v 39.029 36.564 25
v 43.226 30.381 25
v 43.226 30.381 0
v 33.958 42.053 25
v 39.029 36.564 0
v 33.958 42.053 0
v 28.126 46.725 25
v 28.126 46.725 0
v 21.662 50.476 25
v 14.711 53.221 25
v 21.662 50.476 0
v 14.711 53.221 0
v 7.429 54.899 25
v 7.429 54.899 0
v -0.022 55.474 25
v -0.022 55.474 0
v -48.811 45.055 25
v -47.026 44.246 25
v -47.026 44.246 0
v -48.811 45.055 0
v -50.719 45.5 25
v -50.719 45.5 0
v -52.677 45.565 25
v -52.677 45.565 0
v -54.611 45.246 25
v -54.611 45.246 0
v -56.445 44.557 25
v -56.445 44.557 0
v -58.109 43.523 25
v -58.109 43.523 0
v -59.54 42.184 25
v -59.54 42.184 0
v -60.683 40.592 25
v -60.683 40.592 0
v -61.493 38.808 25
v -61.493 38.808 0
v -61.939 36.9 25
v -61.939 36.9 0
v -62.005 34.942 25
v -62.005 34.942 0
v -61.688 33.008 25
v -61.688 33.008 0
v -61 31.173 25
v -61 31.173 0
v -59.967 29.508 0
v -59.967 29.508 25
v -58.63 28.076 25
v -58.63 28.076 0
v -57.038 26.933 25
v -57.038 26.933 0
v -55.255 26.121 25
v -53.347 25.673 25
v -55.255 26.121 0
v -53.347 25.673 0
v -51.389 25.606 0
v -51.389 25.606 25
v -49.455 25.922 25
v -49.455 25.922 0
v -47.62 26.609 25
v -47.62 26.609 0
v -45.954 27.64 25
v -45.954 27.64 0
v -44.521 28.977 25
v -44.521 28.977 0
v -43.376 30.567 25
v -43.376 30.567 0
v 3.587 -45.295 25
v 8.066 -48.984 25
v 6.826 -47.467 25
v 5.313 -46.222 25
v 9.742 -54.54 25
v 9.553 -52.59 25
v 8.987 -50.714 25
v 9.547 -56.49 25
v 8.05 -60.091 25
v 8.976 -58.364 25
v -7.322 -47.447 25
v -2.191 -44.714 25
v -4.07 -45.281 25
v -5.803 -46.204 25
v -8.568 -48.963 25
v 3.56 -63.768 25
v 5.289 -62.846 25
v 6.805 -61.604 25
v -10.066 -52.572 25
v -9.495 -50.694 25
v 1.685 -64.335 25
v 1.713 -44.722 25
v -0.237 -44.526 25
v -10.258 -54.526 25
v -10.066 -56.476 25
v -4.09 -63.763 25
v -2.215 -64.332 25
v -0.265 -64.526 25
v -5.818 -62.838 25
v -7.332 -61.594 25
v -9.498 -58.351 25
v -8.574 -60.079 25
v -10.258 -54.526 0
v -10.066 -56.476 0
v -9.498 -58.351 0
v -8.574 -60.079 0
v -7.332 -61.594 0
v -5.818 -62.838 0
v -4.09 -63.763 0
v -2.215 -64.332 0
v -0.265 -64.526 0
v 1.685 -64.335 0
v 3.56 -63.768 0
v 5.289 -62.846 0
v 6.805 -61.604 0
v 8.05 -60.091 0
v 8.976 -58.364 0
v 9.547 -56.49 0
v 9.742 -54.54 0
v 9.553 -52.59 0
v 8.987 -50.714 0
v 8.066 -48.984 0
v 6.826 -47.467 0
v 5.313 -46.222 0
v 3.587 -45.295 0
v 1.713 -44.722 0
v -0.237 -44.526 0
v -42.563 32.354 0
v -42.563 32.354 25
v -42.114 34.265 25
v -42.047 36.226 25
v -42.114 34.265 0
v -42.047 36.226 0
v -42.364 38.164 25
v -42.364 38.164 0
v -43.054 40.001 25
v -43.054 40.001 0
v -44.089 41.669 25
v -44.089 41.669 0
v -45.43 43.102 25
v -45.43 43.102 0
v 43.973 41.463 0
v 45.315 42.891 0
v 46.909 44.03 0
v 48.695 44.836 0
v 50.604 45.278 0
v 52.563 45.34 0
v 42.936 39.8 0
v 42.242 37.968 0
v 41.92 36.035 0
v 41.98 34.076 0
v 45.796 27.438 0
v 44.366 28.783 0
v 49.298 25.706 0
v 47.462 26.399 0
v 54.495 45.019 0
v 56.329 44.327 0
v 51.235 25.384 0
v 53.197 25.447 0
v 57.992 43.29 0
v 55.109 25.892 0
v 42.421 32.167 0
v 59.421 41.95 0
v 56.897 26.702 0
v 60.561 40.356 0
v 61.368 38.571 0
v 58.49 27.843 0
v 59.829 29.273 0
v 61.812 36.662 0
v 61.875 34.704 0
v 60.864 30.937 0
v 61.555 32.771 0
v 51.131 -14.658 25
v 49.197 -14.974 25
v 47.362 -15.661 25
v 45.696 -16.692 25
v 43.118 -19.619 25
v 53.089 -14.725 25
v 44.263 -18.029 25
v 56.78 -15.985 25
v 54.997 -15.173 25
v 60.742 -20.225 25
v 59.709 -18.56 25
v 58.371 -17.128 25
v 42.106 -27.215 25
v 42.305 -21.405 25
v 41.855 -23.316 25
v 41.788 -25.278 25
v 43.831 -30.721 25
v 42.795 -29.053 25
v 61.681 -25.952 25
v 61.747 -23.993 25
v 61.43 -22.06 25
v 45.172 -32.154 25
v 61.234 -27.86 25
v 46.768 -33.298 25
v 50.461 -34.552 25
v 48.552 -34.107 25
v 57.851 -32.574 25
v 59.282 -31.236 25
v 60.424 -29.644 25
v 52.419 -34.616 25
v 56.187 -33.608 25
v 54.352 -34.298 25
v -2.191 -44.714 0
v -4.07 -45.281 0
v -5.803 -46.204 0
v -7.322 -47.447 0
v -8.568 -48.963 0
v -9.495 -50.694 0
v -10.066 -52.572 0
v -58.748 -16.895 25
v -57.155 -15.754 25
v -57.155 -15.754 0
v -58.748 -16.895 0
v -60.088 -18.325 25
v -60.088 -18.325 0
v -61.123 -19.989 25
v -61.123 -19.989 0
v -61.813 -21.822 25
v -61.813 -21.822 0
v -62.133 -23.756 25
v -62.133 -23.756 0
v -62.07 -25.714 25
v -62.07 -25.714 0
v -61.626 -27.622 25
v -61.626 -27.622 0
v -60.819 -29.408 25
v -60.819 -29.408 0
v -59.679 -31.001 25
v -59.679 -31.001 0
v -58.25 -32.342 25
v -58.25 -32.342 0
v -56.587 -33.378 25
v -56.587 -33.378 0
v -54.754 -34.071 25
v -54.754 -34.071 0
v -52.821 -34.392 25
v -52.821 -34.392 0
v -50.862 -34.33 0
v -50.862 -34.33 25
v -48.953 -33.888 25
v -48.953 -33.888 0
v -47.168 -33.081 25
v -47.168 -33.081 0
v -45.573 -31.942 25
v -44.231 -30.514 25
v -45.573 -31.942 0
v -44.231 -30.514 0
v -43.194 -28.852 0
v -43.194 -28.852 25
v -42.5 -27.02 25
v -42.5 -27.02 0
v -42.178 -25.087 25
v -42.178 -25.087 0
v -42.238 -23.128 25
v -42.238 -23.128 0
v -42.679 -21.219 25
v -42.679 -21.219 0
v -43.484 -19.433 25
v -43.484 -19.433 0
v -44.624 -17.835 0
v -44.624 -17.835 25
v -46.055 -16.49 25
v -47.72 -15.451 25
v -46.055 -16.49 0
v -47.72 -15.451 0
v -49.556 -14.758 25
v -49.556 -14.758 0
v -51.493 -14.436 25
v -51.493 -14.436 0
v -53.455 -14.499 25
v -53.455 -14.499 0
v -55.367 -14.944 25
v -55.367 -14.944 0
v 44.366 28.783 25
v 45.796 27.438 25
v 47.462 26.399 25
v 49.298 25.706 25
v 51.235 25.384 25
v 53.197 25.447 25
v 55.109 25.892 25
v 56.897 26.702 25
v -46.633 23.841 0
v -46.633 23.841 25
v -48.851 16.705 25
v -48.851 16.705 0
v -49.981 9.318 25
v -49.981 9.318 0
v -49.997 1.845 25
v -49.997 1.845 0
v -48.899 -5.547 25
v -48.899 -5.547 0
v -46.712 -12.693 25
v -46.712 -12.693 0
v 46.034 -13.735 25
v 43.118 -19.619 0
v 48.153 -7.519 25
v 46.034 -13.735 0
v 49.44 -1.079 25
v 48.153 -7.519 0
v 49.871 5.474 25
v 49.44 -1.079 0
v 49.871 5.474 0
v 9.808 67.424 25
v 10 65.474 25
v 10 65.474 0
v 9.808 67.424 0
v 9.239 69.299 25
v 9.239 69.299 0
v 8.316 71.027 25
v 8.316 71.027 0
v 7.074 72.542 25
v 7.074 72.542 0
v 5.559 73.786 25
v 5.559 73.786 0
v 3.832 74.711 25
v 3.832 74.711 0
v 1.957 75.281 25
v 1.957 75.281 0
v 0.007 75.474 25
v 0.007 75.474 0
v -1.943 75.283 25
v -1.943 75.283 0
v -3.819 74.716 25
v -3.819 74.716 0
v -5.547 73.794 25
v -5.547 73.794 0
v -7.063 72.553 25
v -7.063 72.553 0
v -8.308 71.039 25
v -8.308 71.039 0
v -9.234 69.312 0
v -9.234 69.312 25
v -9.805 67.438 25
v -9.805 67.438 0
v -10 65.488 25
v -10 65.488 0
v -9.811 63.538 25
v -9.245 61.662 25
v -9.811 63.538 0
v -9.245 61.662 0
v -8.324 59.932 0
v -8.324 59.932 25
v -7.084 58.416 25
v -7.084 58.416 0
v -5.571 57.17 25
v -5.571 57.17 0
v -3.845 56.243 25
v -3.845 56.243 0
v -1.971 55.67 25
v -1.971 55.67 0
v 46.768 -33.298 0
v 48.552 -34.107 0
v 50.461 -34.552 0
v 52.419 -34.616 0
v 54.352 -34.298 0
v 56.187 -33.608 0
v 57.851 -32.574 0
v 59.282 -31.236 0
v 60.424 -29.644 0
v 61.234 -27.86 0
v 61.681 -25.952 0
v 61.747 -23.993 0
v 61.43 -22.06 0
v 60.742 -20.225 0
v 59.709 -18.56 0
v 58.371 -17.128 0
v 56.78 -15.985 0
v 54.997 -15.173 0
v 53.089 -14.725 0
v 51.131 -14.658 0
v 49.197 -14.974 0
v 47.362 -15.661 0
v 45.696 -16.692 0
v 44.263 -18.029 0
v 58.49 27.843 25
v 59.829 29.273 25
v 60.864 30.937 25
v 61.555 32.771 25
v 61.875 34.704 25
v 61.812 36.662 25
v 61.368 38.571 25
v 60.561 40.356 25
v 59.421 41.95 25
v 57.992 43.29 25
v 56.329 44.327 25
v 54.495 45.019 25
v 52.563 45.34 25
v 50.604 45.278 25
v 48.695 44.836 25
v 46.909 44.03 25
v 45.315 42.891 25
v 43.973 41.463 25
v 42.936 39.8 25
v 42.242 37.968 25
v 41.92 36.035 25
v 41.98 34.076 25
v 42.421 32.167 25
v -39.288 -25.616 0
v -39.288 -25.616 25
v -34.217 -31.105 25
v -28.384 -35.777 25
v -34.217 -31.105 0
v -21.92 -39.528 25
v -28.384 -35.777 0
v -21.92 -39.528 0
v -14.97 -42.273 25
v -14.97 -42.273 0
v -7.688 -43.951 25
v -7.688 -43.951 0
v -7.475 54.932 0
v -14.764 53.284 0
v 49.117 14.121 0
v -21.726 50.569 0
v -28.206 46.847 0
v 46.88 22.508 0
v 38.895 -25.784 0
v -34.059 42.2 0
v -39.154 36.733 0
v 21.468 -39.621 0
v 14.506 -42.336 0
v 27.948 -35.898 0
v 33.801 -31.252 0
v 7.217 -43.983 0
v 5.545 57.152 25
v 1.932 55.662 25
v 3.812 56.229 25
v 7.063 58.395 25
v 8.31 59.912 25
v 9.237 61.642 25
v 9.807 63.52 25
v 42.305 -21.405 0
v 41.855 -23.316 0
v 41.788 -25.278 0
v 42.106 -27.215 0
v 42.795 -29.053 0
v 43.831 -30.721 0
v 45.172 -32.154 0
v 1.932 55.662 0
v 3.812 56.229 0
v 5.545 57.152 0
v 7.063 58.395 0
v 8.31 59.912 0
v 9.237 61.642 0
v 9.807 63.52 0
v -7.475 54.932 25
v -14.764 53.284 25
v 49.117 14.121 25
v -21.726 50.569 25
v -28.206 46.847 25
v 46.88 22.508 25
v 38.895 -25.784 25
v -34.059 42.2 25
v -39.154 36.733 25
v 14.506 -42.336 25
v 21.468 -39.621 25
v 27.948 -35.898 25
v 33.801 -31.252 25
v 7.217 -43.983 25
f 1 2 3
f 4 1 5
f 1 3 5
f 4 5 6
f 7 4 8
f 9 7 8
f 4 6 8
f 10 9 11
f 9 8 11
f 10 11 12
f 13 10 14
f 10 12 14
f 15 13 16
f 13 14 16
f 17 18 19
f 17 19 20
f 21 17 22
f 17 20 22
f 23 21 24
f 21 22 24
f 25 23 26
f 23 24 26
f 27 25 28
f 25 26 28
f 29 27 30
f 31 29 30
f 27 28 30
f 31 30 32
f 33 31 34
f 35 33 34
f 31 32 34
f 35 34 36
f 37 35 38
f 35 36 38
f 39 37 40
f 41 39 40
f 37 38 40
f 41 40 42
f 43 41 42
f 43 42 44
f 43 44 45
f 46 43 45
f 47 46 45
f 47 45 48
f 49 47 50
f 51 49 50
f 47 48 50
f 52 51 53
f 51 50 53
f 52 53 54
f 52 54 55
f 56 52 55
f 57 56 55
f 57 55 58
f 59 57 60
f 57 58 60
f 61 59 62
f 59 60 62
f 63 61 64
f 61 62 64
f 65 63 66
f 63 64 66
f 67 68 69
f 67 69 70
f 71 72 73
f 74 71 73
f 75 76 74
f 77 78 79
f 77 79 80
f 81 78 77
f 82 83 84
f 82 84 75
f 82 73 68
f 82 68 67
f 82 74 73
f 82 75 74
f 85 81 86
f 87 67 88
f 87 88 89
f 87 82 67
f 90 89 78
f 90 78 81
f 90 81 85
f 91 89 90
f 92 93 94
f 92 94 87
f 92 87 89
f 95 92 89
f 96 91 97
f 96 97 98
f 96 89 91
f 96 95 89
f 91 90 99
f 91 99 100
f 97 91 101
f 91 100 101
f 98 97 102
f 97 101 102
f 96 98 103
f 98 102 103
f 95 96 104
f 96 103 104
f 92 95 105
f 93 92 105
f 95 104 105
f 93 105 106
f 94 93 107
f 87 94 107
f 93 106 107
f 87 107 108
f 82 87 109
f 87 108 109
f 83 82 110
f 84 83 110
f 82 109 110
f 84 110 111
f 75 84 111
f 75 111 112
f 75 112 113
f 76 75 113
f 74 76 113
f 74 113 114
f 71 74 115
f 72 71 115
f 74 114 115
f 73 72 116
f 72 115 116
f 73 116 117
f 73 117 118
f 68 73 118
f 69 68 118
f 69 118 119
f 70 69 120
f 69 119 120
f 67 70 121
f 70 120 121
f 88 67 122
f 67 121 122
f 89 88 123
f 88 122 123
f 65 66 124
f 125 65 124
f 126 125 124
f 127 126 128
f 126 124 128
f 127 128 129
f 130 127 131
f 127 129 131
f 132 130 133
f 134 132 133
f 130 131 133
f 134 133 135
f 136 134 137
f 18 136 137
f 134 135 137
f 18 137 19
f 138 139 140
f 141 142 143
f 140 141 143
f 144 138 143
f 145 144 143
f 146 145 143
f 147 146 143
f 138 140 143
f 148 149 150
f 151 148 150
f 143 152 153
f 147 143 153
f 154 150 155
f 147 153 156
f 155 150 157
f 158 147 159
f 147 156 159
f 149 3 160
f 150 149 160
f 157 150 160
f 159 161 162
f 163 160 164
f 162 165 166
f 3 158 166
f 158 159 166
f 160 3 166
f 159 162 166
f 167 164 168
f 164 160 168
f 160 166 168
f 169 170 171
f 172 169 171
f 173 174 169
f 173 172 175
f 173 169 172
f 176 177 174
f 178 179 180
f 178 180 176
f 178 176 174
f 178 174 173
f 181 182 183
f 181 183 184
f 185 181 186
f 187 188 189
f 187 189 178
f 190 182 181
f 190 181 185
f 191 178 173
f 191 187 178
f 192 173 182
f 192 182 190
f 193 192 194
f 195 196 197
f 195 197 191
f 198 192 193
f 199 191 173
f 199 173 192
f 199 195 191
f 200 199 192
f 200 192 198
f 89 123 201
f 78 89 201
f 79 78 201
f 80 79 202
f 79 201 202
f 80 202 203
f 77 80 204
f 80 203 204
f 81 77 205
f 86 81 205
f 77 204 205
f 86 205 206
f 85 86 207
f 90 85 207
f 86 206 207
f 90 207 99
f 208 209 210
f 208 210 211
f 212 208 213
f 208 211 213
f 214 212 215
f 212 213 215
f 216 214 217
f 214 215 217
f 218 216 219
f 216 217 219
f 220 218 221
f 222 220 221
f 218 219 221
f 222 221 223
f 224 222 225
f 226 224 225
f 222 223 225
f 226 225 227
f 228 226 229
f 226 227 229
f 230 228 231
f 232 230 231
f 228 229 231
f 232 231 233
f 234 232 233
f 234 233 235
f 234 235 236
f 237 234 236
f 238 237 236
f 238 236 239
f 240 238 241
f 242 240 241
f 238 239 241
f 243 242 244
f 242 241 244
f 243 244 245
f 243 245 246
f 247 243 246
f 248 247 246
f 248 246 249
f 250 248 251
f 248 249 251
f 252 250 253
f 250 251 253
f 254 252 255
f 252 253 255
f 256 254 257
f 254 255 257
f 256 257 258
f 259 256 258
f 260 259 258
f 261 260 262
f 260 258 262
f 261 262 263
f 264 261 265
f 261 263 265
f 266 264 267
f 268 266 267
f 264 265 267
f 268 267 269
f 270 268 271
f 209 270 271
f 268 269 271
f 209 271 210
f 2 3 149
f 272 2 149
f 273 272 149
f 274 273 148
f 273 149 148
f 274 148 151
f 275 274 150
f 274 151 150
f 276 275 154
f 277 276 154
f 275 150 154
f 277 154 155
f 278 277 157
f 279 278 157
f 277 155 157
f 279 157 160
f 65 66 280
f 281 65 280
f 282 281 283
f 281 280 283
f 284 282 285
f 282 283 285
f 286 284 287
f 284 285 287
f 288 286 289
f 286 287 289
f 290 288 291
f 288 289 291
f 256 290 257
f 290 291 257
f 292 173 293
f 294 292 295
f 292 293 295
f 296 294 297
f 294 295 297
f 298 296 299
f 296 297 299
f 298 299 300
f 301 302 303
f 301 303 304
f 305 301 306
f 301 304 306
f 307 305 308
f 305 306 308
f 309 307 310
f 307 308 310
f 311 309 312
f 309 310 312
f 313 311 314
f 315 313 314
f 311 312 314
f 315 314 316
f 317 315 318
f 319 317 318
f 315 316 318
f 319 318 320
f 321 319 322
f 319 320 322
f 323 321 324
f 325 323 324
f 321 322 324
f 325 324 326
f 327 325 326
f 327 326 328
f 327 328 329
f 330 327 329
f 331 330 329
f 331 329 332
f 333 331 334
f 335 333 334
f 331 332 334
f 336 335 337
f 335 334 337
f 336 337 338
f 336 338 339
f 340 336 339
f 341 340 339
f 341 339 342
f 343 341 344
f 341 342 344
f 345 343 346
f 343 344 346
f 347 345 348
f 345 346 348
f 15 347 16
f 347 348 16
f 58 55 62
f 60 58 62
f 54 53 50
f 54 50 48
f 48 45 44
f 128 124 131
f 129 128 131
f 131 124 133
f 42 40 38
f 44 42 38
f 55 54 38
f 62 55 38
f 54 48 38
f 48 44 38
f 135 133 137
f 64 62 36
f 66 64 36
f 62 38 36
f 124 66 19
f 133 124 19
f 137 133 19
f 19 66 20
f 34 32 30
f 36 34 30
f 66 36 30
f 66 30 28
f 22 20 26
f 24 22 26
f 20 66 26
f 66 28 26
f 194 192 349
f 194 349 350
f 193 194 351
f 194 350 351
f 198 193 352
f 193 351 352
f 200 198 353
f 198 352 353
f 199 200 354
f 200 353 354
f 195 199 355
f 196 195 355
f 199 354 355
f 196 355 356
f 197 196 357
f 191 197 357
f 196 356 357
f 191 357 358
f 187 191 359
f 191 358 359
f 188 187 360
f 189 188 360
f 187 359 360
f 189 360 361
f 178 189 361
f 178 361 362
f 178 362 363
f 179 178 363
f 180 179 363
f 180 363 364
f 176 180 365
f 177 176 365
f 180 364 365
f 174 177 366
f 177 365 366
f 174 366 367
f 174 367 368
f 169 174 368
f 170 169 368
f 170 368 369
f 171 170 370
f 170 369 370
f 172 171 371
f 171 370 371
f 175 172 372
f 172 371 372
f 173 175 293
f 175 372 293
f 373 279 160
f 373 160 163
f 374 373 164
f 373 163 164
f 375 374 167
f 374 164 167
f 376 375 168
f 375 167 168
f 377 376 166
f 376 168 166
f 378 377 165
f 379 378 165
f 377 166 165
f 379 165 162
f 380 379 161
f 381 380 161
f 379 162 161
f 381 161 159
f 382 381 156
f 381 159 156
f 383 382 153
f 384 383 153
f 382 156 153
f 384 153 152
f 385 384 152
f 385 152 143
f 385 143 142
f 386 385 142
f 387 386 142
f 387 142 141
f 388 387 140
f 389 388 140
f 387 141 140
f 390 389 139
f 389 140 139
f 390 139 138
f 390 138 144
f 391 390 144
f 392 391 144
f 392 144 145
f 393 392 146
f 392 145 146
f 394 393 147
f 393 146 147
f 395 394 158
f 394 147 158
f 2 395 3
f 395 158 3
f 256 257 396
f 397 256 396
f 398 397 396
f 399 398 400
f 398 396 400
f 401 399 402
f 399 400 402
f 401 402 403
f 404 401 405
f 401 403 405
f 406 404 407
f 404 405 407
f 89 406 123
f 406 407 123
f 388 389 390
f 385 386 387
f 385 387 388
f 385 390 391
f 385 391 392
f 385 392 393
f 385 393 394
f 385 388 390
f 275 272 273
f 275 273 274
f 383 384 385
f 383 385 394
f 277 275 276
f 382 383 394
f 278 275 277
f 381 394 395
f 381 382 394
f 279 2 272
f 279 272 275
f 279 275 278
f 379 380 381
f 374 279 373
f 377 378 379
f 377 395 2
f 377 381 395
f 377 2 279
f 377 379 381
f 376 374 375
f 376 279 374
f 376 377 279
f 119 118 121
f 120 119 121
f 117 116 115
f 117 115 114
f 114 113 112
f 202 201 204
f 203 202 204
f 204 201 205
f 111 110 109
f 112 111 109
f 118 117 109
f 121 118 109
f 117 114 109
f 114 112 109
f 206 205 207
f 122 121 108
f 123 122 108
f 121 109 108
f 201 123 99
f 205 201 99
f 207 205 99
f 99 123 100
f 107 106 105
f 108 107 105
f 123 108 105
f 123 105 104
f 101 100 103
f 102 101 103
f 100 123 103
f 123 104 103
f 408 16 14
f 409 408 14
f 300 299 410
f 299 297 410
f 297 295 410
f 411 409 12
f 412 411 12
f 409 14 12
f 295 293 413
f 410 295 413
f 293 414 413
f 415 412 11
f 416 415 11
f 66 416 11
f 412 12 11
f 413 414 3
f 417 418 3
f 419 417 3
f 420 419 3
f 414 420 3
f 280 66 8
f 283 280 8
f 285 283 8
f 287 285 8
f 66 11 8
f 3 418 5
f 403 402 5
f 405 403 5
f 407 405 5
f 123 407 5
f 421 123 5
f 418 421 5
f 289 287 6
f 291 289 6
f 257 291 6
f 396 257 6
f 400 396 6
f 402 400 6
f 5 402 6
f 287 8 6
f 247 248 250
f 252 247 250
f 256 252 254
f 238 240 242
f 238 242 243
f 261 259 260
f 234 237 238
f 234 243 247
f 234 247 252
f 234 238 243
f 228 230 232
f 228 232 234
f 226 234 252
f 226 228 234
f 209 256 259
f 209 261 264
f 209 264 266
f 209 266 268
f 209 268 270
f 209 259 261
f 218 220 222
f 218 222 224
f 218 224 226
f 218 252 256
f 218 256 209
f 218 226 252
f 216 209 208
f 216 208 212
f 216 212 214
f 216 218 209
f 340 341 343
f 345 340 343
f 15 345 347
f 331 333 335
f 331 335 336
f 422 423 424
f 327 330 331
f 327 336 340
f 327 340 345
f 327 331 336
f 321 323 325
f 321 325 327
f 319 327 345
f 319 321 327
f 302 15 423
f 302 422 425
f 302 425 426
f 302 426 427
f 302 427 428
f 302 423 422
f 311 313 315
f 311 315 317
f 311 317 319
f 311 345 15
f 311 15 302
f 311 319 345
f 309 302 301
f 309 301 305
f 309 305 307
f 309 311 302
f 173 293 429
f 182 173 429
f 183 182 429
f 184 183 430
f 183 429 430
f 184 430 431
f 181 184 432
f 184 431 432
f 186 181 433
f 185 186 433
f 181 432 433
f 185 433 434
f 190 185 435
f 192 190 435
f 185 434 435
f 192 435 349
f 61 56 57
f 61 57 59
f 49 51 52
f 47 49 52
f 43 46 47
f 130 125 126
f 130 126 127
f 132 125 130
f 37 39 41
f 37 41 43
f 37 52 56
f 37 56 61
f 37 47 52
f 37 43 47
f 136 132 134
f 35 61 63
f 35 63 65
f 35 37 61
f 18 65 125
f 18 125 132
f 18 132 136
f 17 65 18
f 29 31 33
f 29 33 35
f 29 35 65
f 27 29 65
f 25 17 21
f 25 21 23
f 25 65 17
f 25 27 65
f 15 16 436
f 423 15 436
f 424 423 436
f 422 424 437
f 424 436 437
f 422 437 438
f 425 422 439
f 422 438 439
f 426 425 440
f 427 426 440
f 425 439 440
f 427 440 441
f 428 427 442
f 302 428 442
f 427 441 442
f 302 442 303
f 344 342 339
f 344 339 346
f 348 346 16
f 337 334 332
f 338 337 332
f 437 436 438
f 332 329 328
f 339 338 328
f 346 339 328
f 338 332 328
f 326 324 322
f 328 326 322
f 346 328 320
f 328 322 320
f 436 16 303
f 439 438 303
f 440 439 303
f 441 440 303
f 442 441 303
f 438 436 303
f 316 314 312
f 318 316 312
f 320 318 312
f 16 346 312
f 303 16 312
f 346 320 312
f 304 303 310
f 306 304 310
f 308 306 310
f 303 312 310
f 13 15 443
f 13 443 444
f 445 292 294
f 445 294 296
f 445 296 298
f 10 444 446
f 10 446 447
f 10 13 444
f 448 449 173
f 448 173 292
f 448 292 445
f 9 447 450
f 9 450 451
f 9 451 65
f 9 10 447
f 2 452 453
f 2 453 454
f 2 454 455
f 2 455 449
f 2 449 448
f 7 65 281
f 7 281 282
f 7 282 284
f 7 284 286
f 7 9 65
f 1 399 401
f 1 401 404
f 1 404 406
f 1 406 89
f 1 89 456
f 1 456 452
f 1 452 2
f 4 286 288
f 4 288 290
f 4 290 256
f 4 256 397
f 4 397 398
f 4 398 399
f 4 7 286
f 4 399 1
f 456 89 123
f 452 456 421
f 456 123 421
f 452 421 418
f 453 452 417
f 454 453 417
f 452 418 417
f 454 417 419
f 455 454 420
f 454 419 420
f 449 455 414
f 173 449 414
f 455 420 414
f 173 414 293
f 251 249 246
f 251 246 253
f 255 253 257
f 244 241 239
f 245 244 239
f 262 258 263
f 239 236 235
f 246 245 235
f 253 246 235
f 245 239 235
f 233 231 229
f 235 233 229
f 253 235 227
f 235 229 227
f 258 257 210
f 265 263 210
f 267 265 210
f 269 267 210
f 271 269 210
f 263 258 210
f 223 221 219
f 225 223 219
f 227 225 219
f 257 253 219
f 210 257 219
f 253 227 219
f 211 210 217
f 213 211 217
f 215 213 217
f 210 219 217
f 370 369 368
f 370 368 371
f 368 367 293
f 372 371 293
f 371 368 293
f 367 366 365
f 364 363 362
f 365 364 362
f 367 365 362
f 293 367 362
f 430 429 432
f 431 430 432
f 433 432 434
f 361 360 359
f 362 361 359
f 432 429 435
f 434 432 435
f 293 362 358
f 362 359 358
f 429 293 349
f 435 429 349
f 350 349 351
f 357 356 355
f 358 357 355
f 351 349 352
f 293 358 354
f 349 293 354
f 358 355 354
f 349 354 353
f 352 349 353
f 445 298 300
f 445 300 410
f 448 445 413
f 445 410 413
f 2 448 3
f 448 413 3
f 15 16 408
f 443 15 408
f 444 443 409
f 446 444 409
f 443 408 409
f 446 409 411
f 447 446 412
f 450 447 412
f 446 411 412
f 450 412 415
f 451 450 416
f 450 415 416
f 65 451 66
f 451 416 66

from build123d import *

# Parameters (mm, degrees)
F1_DEPTH = 25
F2_DEPTH = 25
F3_COUNT = 6


with BuildPart() as f1:
    # F0 (on Top) → F1 (new body)
    with BuildSketch(Plane.XY):
        with BuildLine():
            ThreePointArc((-0.0215190918, 55.4739596518), (-35.5224711994, -29.8432031255), (49.8708874497, 5.4740754154))
            ThreePointArc((49.8708874497, 5.4740754154), (35.2642460987, 40.7913539563), (-0.0215190918, 55.4739596518))
        make_face()
    extrude(amount=F1_DEPTH)

    # F0 (on Top) → F2 (join)
    with BuildSketch(Plane.XY):
        with BuildLine():
            ThreePointArc((10, 65.4739364982), (-7.0634555666, 72.5526083693), (-0.0215190918, 55.4739596518))
            ThreePointArc((-0.0215190918, 55.4739596518), (7.0634555666, 58.395264627), (10, 65.4739364982))
        make_face()
    extrude(amount=F2_DEPTH)

    # F3: F1 ×6 about axis
    f3_axis = Axis((-0.1291125503, 5.4740754154, 25), (0, 0, -1))


with BuildPart() as f1_1:
    add(f1.part)
    for i in range(1, F3_COUNT):
        add(f1.part.rotate(f3_axis, i * 360 / F3_COUNT))


solid = f1_1.part
